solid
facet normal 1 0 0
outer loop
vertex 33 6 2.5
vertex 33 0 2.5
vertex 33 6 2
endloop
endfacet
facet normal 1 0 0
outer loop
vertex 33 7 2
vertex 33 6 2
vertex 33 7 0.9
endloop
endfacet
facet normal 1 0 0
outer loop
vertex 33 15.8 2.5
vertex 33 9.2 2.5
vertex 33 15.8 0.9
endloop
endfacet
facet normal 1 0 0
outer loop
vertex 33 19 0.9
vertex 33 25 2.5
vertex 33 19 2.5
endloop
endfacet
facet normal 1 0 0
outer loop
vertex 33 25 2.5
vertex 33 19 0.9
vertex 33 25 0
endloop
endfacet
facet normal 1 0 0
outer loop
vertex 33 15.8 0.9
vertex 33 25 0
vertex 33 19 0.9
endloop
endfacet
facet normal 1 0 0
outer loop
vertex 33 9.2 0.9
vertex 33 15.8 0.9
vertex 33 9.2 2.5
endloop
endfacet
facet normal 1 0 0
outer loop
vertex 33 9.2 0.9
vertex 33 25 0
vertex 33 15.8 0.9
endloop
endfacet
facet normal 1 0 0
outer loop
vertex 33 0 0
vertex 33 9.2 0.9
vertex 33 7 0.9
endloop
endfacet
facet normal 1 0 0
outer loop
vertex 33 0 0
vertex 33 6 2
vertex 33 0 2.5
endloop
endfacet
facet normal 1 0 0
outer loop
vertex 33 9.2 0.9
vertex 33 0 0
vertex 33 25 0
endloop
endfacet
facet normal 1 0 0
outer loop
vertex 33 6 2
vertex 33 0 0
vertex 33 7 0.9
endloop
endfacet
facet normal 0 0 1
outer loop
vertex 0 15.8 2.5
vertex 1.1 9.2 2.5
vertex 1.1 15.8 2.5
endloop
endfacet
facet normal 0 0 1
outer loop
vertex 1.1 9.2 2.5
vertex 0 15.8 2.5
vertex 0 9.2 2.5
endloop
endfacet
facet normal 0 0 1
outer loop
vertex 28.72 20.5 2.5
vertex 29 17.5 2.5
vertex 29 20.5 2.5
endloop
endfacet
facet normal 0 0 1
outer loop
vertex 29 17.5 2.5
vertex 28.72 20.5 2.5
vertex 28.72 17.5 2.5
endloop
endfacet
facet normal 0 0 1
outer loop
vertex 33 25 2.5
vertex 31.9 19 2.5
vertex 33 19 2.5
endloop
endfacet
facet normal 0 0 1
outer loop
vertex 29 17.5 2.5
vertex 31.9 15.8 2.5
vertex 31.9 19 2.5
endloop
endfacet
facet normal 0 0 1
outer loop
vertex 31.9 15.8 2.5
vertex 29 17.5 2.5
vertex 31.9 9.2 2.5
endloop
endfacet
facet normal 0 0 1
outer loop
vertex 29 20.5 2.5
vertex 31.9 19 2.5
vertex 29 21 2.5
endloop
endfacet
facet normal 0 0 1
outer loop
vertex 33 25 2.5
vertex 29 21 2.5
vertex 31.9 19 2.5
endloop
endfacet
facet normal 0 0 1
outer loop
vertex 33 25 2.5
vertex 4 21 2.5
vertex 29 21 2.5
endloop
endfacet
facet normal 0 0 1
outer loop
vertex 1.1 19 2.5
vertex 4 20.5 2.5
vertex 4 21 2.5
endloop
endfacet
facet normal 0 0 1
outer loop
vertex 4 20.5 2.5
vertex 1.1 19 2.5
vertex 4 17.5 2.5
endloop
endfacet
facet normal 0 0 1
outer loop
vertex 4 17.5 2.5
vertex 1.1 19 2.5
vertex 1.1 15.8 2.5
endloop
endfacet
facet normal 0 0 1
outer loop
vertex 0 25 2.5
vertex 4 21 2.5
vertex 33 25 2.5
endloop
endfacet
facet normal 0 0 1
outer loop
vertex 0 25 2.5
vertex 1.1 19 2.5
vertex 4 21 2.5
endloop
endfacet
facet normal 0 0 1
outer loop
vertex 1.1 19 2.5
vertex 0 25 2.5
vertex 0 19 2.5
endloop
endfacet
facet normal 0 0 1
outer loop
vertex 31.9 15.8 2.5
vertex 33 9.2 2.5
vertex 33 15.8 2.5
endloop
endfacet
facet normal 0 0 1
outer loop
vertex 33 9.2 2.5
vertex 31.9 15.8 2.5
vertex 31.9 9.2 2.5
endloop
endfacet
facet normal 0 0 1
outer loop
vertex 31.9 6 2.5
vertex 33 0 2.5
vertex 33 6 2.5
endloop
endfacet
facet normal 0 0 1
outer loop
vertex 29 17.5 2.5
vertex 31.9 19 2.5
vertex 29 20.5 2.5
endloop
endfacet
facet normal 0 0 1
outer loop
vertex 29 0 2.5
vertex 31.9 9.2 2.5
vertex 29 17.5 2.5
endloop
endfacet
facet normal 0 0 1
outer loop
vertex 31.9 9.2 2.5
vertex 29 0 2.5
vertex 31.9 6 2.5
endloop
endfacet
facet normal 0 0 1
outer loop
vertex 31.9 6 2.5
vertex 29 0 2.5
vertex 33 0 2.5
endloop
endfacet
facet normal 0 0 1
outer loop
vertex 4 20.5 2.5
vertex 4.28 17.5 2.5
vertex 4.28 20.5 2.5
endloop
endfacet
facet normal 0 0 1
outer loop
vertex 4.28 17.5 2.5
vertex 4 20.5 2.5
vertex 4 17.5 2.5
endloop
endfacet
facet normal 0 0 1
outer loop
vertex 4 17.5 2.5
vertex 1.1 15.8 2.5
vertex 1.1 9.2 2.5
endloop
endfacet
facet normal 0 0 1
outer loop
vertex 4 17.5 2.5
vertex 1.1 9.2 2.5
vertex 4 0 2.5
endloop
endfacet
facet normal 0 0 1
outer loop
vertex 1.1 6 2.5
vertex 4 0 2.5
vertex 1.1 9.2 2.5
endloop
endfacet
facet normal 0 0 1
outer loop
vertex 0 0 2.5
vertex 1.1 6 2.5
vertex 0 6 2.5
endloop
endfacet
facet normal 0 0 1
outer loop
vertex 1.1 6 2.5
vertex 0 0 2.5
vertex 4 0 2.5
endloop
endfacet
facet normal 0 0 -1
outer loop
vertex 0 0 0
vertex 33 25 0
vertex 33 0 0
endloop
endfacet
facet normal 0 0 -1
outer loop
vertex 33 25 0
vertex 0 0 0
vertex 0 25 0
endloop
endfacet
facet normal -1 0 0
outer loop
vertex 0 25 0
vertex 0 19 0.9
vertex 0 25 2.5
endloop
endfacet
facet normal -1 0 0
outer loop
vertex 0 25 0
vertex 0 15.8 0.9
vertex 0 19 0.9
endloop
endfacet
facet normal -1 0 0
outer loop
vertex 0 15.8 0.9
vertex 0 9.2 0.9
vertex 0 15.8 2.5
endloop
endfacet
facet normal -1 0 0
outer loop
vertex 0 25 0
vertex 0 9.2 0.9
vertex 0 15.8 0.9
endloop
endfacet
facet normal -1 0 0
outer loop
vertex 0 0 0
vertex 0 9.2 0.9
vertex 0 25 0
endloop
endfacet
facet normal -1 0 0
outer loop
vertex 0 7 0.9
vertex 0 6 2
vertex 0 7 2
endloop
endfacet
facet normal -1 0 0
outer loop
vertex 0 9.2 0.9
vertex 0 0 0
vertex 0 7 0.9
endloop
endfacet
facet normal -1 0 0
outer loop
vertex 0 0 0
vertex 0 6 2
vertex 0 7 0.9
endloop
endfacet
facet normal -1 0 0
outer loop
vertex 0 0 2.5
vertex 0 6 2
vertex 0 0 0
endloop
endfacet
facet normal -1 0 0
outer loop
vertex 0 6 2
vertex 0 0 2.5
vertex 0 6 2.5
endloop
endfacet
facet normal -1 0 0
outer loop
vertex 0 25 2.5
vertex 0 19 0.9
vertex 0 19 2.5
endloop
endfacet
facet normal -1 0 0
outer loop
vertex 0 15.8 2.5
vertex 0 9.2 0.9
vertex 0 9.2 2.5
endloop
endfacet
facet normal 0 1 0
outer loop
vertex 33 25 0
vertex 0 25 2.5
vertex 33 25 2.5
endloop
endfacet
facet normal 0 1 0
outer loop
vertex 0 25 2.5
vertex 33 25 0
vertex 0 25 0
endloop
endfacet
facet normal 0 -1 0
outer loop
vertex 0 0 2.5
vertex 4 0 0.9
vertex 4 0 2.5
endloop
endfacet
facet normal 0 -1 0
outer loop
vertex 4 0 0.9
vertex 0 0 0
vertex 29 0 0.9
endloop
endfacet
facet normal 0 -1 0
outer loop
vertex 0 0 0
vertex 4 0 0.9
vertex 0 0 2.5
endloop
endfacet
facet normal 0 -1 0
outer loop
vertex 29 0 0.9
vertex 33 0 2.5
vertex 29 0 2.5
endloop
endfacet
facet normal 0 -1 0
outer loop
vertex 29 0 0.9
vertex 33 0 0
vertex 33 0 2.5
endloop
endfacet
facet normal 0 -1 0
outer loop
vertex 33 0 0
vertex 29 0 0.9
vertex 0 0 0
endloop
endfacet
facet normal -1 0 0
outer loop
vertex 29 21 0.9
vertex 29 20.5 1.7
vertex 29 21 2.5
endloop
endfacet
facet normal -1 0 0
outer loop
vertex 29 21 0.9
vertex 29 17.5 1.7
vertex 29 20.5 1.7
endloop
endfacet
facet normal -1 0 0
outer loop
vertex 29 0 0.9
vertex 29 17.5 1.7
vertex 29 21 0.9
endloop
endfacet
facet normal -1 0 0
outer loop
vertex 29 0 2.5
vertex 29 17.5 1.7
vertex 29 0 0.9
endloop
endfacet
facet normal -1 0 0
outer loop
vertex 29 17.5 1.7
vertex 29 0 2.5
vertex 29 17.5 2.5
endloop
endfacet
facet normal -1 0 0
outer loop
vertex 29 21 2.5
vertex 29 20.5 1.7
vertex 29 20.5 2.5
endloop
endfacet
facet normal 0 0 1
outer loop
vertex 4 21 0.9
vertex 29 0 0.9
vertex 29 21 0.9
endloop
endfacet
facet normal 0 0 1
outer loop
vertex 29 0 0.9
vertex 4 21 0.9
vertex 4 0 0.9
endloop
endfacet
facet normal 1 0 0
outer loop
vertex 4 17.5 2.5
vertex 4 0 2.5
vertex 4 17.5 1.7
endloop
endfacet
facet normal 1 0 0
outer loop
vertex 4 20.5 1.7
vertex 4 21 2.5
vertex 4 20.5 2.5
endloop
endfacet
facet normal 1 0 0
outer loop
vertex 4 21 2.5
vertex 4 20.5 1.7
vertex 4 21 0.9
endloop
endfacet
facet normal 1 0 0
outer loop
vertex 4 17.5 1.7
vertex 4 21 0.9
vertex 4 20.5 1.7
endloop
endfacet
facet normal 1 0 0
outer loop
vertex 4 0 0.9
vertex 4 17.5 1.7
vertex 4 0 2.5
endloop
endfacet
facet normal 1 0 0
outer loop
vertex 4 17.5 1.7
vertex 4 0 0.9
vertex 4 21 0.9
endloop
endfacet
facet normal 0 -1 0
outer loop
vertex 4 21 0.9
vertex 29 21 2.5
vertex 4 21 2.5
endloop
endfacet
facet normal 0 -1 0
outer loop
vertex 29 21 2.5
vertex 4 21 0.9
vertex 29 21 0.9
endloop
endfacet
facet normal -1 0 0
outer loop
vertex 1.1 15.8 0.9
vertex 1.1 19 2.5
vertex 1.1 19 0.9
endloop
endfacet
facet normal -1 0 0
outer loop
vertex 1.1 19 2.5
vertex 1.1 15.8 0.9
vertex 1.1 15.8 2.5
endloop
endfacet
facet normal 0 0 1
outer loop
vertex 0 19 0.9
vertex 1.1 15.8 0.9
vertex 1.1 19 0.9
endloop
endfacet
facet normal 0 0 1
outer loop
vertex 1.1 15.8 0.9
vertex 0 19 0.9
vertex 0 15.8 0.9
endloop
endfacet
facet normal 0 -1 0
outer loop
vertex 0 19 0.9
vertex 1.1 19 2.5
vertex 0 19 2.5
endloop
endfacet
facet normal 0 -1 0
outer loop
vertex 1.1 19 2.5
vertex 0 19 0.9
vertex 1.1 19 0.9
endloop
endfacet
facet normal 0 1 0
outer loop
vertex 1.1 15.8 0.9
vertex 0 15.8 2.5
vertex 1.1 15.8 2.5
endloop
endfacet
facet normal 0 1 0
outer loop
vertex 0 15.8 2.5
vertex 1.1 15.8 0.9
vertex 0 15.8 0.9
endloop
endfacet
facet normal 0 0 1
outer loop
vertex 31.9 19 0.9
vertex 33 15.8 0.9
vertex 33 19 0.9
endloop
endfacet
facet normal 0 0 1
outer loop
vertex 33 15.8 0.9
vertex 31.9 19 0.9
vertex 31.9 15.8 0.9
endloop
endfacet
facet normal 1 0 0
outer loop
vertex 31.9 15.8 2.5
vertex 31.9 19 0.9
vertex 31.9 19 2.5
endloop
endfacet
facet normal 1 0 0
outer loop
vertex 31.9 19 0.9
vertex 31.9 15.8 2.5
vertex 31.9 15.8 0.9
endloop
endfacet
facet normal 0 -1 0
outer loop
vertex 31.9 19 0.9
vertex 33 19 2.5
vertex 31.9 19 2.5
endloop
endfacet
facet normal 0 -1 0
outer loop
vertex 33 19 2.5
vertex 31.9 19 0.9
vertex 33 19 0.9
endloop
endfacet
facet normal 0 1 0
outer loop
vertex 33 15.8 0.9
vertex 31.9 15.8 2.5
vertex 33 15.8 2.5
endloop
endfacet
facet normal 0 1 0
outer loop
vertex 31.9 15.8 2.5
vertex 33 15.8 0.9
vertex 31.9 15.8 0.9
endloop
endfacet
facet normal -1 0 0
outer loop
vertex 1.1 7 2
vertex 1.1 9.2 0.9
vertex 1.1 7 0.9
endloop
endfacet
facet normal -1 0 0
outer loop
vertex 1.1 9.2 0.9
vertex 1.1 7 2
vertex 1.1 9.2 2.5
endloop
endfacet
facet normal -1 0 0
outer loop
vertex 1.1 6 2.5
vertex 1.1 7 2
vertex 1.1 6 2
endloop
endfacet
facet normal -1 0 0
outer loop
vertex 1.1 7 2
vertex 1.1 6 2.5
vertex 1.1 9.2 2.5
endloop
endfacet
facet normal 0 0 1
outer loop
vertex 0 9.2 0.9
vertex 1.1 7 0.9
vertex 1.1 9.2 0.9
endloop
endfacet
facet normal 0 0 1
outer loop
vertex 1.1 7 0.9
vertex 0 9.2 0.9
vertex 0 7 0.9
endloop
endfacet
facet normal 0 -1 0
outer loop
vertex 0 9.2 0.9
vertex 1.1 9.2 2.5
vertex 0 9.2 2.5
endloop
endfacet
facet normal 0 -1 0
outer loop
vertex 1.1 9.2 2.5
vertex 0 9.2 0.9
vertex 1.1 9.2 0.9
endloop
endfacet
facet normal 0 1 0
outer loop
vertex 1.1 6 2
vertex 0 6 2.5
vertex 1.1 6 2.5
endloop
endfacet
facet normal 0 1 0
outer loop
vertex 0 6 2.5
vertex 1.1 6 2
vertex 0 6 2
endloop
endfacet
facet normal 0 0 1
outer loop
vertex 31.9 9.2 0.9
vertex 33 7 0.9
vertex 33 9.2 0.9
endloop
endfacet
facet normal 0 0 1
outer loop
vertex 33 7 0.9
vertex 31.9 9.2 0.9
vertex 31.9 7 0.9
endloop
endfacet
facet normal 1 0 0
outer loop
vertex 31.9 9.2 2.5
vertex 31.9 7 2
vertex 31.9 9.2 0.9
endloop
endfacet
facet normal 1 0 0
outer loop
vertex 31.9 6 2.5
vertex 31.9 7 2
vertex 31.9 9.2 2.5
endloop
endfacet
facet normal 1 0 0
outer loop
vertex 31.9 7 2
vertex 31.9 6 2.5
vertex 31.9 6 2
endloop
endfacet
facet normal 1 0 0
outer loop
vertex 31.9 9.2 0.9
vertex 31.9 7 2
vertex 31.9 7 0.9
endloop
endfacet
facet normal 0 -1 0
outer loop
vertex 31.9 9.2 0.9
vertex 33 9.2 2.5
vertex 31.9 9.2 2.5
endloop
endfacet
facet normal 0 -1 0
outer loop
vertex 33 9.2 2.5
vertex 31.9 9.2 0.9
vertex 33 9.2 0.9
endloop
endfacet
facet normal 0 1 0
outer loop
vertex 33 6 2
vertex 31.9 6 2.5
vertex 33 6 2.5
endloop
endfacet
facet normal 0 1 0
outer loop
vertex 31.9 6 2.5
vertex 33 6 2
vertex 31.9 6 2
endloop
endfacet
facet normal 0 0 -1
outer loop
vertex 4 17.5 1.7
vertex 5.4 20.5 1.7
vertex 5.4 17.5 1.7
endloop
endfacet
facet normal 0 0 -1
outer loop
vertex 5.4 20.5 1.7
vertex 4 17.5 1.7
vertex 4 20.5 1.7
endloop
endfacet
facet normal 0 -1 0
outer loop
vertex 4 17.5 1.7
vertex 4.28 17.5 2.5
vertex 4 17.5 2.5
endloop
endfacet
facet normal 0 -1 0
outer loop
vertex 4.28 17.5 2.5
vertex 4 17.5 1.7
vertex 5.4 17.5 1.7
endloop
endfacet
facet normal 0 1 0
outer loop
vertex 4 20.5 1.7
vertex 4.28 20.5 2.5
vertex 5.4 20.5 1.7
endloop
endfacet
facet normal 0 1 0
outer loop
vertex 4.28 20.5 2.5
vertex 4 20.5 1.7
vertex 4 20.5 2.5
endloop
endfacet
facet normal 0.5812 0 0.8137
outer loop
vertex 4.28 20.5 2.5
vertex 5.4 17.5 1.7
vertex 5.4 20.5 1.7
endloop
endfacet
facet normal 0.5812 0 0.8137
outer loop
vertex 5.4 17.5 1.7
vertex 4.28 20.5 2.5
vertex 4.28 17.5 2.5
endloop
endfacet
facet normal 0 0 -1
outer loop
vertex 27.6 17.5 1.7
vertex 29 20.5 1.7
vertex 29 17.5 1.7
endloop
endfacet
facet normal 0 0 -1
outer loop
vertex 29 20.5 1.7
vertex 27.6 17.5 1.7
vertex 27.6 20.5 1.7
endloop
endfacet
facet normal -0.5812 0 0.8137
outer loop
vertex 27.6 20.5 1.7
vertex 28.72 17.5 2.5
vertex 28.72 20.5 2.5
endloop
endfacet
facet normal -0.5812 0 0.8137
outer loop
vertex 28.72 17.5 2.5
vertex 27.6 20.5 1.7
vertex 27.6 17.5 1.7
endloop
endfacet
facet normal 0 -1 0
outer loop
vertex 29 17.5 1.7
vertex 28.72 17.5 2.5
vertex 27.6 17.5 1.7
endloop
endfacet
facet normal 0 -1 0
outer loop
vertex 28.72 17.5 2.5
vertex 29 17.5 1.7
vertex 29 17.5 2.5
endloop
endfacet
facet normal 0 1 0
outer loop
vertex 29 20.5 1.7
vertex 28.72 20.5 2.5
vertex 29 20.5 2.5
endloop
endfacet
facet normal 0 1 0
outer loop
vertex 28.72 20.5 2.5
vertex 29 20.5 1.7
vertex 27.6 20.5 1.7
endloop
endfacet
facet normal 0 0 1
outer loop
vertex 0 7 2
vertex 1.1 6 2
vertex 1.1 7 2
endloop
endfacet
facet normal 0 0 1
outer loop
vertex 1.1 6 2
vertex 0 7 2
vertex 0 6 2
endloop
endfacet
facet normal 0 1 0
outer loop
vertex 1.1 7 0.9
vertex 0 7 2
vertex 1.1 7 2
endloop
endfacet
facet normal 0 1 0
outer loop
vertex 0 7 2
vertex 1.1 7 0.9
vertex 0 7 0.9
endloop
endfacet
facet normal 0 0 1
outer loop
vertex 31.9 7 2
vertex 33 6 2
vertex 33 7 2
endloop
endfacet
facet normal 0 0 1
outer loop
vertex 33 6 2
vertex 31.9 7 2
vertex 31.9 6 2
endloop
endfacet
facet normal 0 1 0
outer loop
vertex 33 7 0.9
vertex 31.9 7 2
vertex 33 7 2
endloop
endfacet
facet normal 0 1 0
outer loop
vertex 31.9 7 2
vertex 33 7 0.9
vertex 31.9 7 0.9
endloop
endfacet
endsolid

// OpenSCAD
// MSD MiniDisc-style SD shell – WORKING VERSION WITH ROUNDED EDGES + VISIBLE BOTTOM SLOT
// with captive tray using side latches + tray notches

// Overall body
prusa_mini_mode = true;   // set false if slicing on a different printer
body_w          = 68;
body_h_full     = 72;
// Set body_h_test < body_h_full to print a shortened shell (for quick tray/aperture tests)
body_h_test = body_h_full;
body_h      = body_h_test;
body_t      = 5;

// Corner radii
corner_r_outer = 2;   // outer shell corners
corner_r_inner = 2;   // inner window corners

// Label recess (big window)
label_margin_x = 4;
label_margin_y = 9;
label_d        = 0.3;

// Top grips
grip_w       = 30;
grip_h       = 0.8;
grip_d       = 0.6;
grip_spacing = 1.2;
grip_count   = 3;

// Center grips in the top margin (label_margin_y)
// Total height of grips = count*h + (count-1)*spacing
_grip_total_h = grip_count*grip_h + (grip_count-1)*grip_spacing;
_grip_top_margin = (label_margin_y - _grip_total_h) / 2;
grip_offset_y = _grip_top_margin + grip_h;

// Tray + SD parameters
tray_w   = 33;
tray_h   = 25;    // shorter than SD card so contacts stick out
tray_t   = 2.5;   // thickened slightly for strength

sd_w       = 24;
sd_l       = 32;
pocket_w   = sd_w + 1.0;
nose_buf   = 4;

// pocket fills from the back of the tray up to the "nose"
pocket_l   = tray_h - nose_buf;   // 25 - 4 = 21mm
pocket_d   = 1.6;

// Slot / cavity sizing
slot_height_base    = 3.3;                  // clearance for SD stack (~3.0mm)
bridge_sag_allowance = prusa_mini_mode ? 0.2 : 0;  // extra headroom for 0.4mm nozzle bridging
slot_height         = slot_height_base + bridge_sag_allowance;
slot_clearance_base = 0.3;
slot_clearance      = slot_clearance_base + (prusa_mini_mode ? 0.05 : 0); // a touch looser for Mini/Mini+

// We want the SD card (length sd_l) + tray back to sit slightly recessed
// inside the shell when fully inserted.
// The cavity starts at y = -3 and goes to y = -3 + cav_h,
// so internal depth from the bottom edge is (cav_h - 3).
recess_margin  = 2;                      // how far inside the shell the card sits
cav_depth_int  = sd_l + recess_margin;   // internal depth from bottom edge
cav_h          = cav_depth_int + 3;      // +3 because slot starts at y = -3

cav_w          = tray_w + 2*slot_clearance;  // snug slot around tray
cav_t          = slot_height;
cavity_x       = (body_w - cav_w)/2;    // centre slot under label

// Finger access hole in underside (to push tray)
finger_hole_w       = tray_w - 20;   // a bit narrower than tray
finger_hole_len     = 18;           // how far up into the body
finger_hole_marginY = 4;            // gap from bottom edge
finger_hole_depth   = 2.0;          // depth from underside (must be < body_t)

// Tray captive system – shell latches + tray notches
latch_depth_x   = 0.8;   // how far latches protrude into slot from each side
latch_height_z  = slot_height;   // full height of slot
latch_len_y     = 3.0;   // length along travel direction
latch_offset_y  = 2.0;   // how far inside from slot opening (y=0)

// Tray notches (matching latches)
notch_depth_x     = latch_depth_x + 0.3; // a touch deeper than latch for clearance
notch_height_z    = 1.6;
notch_len_y       = 3.2;
notch_from_front  = 6.0;         // distance back from tray front edge (extended lock)
notch_from_back   = 6.0;         // distance forward from tray rear (retracted lock)

// Lead-in chamfer for shell slot to ease first insert
slot_chamfer = 0.6;

// Front over-travel stop height (small rib on roof near opening)
front_stop_h = 0.8;

// ---------- helper: 2D rounded rectangle ----------
module rounded_rect_2d(w,h,r){
    r = min(r, min(w,h)/2);
    translate([r,r])
    minkowski(){
        square([w-2*r, h-2*r], center=false);
        circle(r=r, $fn=40);
    }
}

// ---------- helper: print-friendly ramp lip ----------
module printable_lip(depth, length, height) {
    polyhedron(
        points = [
            [0,0,0],                       // 0 bottom inside
            [depth,0,0],                   // 1 bottom outer
            [0,length,0],                  // 2 bottom inside front
            [depth,length,0],              // 3 bottom outer front

            [0,0,height],                  // 4 top inside
            [depth*0.2,0,height],          // 5 angled top
            [0,length,height],             // 6 top inside front
            [depth*0.2,length,height]      // 7 angled top front
        ],
        faces = [
            [0,1,3,2],    // bottom
            [0,2,6,4],    // inside wall
            [1,5,7,3],    // outside sloped wall
            [4,6,7,5],    // top
            [0,4,5,1],    // back
            [2,3,7,6]     // front
        ]
    );
}

// ---------- SHELL ----------
module miniDiscShell() {
    union() {
        // Main body with all subtractions
        difference() {
            // 1) OUTER BODY WITH ROUNDED CORNERS
            linear_extrude(height = body_t)
                rounded_rect_2d(body_w, body_h, corner_r_outer);

            // 2) INTERNAL TRAY CAVITY – centred slot, open at bottom edge only
            // Add a small chamfer on the opening edges to ease first insertion.
            hull() {
                translate([
                    cavity_x + slot_chamfer,
                    -3,
                    (body_t - cav_t)/2 + slot_chamfer
                ])
                    cube([cav_w - 2*slot_chamfer, cav_h, cav_t - 2*slot_chamfer], center=false);
                translate([
                    cavity_x,
                    -3 - slot_chamfer,
                    (body_t - cav_t)/2
                ])
                    cube([cav_w, cav_h, cav_t], center=false);
            }

            // 2b) RECTANGULAR FINGER HOLE IN UNDERSIDE
            translate([
                (body_w - finger_hole_w)/2,  // centred left–right under the tray
                finger_hole_marginY,         // a few mm up from bottom edge
                0                            // start at underside
            ])
                cube([finger_hole_w, finger_hole_len, finger_hole_depth], center=false);

            // 3) BIG LABEL RECESS, CENTRED, ALSO ROUNDED
            label_w = body_w - 2*label_margin_x;
            label_h = body_h - 2*label_margin_y;
            translate([
                label_margin_x,
                label_margin_y,
                body_t - label_d
            ])
                linear_extrude(height = label_d + 0.1)
                    rounded_rect_2d(label_w, label_h, corner_r_inner);

            // 4) TOP GRIP GROOVES
            for (i = [0:grip_count-1]) {
                translate([
                    (body_w - grip_w)/2,
                    body_h - grip_offset_y - (i * (grip_h + grip_spacing)),
                    body_t - grip_d
                ])
                    cube([grip_w, grip_h, grip_d + 0.1], center=false);
            }

            // 5) SMALL ARROW ENGRAVED BOTTOM-RIGHT (pointing DOWN)
            arrow_d = 0.4;
            arrow_w = 4;
            arrow_h = 6;

            translate([body_w-9, 4.5, body_t - arrow_d])
                linear_extrude(height = arrow_d + 0.1) {
                    union() {
                        square([arrow_w, arrow_h-3], center=false);
                        translate([arrow_w/2, 0, 0])
                            polygon([
                                [-arrow_w/2, 0],
                                [ arrow_w/2, 0],
                                [0, -(arrow_h-3)]
                            ]);
                    }
                }

            // 6) SIDE GRIP VENTS (both sides)
            side_grip_count   = 3;
            side_grip_w       = 1;   // along Y
            side_grip_h       = 4.0;   // along Z
            side_grip_gap     = 0.8;
            side_grip_x_depth = 2.5;   // into body (enough to cut fully)
            side_grip_y_offset = 62;    // up from bottom edge
            side_grip_z_offset = 0.5;  // up from underside

            for (i = [0:side_grip_count-1]) {
                // Right side
                translate([
                    body_w - side_grip_x_depth,
                    side_grip_y_offset + i*(side_grip_w + side_grip_gap),
                    side_grip_z_offset
                ])
                    cube([side_grip_x_depth, side_grip_w, side_grip_h], center=false);

                // Left side
                translate([
                    0,
                    side_grip_y_offset + i*(side_grip_w + side_grip_gap),
                    side_grip_z_offset
                ])
                    cube([side_grip_x_depth, side_grip_w, side_grip_h], center=false);
            }

            // 9) BOTTOM-LEFT DIAGONAL CUTOUT
            // Cut a 45-degree chamfer at [0,0] using a polygon
            // The cut line will be roughly x + y = chamfer_size
            chamfer_size = 4;
            translate([0,0,-1])
                linear_extrude(height=body_t+2)
                    polygon(points=[
                        [-5, -5],           // outside corner
                        [chamfer_size, -5], // bottom edge point
                        [chamfer_size, 0],  // start of chamfer on X
                        [0, chamfer_size],  // end of chamfer on Y
                        [-5, chamfer_size]  // left edge point
                    ]);
        } // end difference()

        // 7) SIDE LATCHES INSIDE SLOT with ramped lead-in for first-time insertion
        // Left latch
        difference() {
            translate([
                cavity_x,                      // flush with left cavity wall
                latch_offset_y,                // inside from opening
                (body_t - cav_t)/2             // centred vertically in slot
            ])
                cube([latch_depth_x, latch_len_y, cav_t], center=false);
            // bevel leading edge to create a ramp for insertion flex
            translate([
                cavity_x - 0.01,
                latch_offset_y - 0.01,
                (body_t - cav_t)/2 + cav_t - notch_height_z
            ])
                rotate([0,90,0])
                    linear_extrude(height = latch_depth_x + 0.02)
                        polygon([[0,0],[notch_height_z,0],[0,latch_len_y+0.02]]);
        }

        // Right latch
        difference() {
            translate([
                cavity_x + cav_w - latch_depth_x,  // flush with right cavity wall
                latch_offset_y,
                (body_t - cav_t)/2
            ])
                cube([latch_depth_x, latch_len_y, cav_t], center=false);
            translate([
                cavity_x + cav_w - latch_depth_x - 0.01,
                latch_offset_y - 0.01,
                (body_t - cav_t)/2 + cav_t - notch_height_z
            ])
                rotate([0,90,0])
                    linear_extrude(height = latch_depth_x + 0.02)
                        polygon([[0,0],[notch_height_z,0],[0,latch_len_y+0.02]]);
        }

        // 8) FRONT STOP RIB ON ROOF TO PREVENT OVER-TRAVEL/EXIT WHEN EXTENDED
        translate([
            cavity_x,
            latch_offset_y + latch_len_y + 1.0,
            (body_t + cav_t)/2 - front_stop_h
        ])
            cube([cav_w, 1.0, front_stop_h], center=false);

        // 9) REAR STOP RIB TO LOCATE FULLY-RETRACTED POSITION
        translate([
            cavity_x,
            cav_h - 1.5,
            (body_t - cav_t)/2
        ])
            cube([cav_w, 1.5, cav_t], center=false);
    }
}

// ---------- TRAY ----------
module sdTray() {
    // Base tray with SD pocket carved out + side notches for latches
    difference() {
        union() {
            // main tray body
            cube([tray_w, tray_h, tray_t], center = false);

            // thumb tab at the front
            tab_w = 20;
            tab_l = 3;
            translate([ (tray_w - tab_w)/2,
                        tray_h - tab_l,
                        0 ])
                cube([tab_w, tab_l, tray_t], center = false);
        }

        // SD card pocket: starts at back (y=0), stops at nose_buf from front
        translate([
            (tray_w - pocket_w)/2,
            0,
            tray_t - pocket_d
        ])
            cube([pocket_w, pocket_l, pocket_d], center = false);

        // Side notches for shell latches (two positions: extended + retracted)
        notch_y_front = tray_h - notch_from_front - notch_len_y;
        notch_y_back  = notch_from_back;

        // Left notch
        translate([
            0,
            notch_y_front,
            tray_t - notch_height_z
        ])
            cube([notch_depth_x, notch_len_y, notch_height_z], center=false);

        // Right notch
        translate([
            tray_w - notch_depth_x,
            notch_y_front,
            tray_t - notch_height_z
        ])
            cube([notch_depth_x, notch_len_y, notch_height_z], center=false);

        // Rear (retracted) notches
        translate([
            0,
            notch_y_back,
            tray_t - notch_height_z
        ])
            cube([notch_depth_x, notch_len_y, notch_height_z], center=false);

        translate([
            tray_w - notch_depth_x,
            notch_y_back,
            tray_t - notch_height_z
        ])
            cube([notch_depth_x, notch_len_y, notch_height_z], center=false);
    }

    // Internal retaining lips (print-friendly ramps) – hold SD card in
    lip_depth  = 1.4;   // reduced for smoother snap (tweak after test)
    lip_height = 0.8;   // vertical size (Z)
    lip_len    = 3.0;   // length along Y

    innerL = (tray_w - pocket_w)/2;   // inner left wall X
    innerR = tray_w - innerL;         // inner right wall X

    // Left lip – attached to left inner wall, ramp inward
    translate([
        innerL,
        pocket_l - lip_len - 0.5,     // near front of pocket
        tray_t - lip_height           // up at pocket roof
    ])
        printable_lip(lip_depth, lip_len, lip_height);

    // Right lip – mirrored, attached to right inner wall, ramp inward
    translate([
        innerR,
        pocket_l - lip_len - 0.5,
        tray_t - lip_height
    ])
        mirror([1,0,0])
            printable_lip(lip_depth, lip_len, lip_height);

    // Side bumps for tray friction in shell
    bump_w = 1.5;
    bump_l = 3;
    bump_h = 1.5;

    translate([0, 4, (tray_t - bump_h)/2])
        cube([bump_w, bump_l, bump_h], center = false);

    translate([tray_w - bump_w, 4, (tray_t - bump_h)/2])
        cube([bump_w, bump_l, bump_h], center = false);
}

// ===== PREVIEW / EXPORT =====

// Shell only:
//miniDiscShell();

// Tray only:
 sdTray();

// Combined preview (shell + tray):
// miniDiscShell();
// translate([ (body_w - tray_w)/2, 0, (body_t - tray_t)/2 ])
//     color("red") sdTray();
